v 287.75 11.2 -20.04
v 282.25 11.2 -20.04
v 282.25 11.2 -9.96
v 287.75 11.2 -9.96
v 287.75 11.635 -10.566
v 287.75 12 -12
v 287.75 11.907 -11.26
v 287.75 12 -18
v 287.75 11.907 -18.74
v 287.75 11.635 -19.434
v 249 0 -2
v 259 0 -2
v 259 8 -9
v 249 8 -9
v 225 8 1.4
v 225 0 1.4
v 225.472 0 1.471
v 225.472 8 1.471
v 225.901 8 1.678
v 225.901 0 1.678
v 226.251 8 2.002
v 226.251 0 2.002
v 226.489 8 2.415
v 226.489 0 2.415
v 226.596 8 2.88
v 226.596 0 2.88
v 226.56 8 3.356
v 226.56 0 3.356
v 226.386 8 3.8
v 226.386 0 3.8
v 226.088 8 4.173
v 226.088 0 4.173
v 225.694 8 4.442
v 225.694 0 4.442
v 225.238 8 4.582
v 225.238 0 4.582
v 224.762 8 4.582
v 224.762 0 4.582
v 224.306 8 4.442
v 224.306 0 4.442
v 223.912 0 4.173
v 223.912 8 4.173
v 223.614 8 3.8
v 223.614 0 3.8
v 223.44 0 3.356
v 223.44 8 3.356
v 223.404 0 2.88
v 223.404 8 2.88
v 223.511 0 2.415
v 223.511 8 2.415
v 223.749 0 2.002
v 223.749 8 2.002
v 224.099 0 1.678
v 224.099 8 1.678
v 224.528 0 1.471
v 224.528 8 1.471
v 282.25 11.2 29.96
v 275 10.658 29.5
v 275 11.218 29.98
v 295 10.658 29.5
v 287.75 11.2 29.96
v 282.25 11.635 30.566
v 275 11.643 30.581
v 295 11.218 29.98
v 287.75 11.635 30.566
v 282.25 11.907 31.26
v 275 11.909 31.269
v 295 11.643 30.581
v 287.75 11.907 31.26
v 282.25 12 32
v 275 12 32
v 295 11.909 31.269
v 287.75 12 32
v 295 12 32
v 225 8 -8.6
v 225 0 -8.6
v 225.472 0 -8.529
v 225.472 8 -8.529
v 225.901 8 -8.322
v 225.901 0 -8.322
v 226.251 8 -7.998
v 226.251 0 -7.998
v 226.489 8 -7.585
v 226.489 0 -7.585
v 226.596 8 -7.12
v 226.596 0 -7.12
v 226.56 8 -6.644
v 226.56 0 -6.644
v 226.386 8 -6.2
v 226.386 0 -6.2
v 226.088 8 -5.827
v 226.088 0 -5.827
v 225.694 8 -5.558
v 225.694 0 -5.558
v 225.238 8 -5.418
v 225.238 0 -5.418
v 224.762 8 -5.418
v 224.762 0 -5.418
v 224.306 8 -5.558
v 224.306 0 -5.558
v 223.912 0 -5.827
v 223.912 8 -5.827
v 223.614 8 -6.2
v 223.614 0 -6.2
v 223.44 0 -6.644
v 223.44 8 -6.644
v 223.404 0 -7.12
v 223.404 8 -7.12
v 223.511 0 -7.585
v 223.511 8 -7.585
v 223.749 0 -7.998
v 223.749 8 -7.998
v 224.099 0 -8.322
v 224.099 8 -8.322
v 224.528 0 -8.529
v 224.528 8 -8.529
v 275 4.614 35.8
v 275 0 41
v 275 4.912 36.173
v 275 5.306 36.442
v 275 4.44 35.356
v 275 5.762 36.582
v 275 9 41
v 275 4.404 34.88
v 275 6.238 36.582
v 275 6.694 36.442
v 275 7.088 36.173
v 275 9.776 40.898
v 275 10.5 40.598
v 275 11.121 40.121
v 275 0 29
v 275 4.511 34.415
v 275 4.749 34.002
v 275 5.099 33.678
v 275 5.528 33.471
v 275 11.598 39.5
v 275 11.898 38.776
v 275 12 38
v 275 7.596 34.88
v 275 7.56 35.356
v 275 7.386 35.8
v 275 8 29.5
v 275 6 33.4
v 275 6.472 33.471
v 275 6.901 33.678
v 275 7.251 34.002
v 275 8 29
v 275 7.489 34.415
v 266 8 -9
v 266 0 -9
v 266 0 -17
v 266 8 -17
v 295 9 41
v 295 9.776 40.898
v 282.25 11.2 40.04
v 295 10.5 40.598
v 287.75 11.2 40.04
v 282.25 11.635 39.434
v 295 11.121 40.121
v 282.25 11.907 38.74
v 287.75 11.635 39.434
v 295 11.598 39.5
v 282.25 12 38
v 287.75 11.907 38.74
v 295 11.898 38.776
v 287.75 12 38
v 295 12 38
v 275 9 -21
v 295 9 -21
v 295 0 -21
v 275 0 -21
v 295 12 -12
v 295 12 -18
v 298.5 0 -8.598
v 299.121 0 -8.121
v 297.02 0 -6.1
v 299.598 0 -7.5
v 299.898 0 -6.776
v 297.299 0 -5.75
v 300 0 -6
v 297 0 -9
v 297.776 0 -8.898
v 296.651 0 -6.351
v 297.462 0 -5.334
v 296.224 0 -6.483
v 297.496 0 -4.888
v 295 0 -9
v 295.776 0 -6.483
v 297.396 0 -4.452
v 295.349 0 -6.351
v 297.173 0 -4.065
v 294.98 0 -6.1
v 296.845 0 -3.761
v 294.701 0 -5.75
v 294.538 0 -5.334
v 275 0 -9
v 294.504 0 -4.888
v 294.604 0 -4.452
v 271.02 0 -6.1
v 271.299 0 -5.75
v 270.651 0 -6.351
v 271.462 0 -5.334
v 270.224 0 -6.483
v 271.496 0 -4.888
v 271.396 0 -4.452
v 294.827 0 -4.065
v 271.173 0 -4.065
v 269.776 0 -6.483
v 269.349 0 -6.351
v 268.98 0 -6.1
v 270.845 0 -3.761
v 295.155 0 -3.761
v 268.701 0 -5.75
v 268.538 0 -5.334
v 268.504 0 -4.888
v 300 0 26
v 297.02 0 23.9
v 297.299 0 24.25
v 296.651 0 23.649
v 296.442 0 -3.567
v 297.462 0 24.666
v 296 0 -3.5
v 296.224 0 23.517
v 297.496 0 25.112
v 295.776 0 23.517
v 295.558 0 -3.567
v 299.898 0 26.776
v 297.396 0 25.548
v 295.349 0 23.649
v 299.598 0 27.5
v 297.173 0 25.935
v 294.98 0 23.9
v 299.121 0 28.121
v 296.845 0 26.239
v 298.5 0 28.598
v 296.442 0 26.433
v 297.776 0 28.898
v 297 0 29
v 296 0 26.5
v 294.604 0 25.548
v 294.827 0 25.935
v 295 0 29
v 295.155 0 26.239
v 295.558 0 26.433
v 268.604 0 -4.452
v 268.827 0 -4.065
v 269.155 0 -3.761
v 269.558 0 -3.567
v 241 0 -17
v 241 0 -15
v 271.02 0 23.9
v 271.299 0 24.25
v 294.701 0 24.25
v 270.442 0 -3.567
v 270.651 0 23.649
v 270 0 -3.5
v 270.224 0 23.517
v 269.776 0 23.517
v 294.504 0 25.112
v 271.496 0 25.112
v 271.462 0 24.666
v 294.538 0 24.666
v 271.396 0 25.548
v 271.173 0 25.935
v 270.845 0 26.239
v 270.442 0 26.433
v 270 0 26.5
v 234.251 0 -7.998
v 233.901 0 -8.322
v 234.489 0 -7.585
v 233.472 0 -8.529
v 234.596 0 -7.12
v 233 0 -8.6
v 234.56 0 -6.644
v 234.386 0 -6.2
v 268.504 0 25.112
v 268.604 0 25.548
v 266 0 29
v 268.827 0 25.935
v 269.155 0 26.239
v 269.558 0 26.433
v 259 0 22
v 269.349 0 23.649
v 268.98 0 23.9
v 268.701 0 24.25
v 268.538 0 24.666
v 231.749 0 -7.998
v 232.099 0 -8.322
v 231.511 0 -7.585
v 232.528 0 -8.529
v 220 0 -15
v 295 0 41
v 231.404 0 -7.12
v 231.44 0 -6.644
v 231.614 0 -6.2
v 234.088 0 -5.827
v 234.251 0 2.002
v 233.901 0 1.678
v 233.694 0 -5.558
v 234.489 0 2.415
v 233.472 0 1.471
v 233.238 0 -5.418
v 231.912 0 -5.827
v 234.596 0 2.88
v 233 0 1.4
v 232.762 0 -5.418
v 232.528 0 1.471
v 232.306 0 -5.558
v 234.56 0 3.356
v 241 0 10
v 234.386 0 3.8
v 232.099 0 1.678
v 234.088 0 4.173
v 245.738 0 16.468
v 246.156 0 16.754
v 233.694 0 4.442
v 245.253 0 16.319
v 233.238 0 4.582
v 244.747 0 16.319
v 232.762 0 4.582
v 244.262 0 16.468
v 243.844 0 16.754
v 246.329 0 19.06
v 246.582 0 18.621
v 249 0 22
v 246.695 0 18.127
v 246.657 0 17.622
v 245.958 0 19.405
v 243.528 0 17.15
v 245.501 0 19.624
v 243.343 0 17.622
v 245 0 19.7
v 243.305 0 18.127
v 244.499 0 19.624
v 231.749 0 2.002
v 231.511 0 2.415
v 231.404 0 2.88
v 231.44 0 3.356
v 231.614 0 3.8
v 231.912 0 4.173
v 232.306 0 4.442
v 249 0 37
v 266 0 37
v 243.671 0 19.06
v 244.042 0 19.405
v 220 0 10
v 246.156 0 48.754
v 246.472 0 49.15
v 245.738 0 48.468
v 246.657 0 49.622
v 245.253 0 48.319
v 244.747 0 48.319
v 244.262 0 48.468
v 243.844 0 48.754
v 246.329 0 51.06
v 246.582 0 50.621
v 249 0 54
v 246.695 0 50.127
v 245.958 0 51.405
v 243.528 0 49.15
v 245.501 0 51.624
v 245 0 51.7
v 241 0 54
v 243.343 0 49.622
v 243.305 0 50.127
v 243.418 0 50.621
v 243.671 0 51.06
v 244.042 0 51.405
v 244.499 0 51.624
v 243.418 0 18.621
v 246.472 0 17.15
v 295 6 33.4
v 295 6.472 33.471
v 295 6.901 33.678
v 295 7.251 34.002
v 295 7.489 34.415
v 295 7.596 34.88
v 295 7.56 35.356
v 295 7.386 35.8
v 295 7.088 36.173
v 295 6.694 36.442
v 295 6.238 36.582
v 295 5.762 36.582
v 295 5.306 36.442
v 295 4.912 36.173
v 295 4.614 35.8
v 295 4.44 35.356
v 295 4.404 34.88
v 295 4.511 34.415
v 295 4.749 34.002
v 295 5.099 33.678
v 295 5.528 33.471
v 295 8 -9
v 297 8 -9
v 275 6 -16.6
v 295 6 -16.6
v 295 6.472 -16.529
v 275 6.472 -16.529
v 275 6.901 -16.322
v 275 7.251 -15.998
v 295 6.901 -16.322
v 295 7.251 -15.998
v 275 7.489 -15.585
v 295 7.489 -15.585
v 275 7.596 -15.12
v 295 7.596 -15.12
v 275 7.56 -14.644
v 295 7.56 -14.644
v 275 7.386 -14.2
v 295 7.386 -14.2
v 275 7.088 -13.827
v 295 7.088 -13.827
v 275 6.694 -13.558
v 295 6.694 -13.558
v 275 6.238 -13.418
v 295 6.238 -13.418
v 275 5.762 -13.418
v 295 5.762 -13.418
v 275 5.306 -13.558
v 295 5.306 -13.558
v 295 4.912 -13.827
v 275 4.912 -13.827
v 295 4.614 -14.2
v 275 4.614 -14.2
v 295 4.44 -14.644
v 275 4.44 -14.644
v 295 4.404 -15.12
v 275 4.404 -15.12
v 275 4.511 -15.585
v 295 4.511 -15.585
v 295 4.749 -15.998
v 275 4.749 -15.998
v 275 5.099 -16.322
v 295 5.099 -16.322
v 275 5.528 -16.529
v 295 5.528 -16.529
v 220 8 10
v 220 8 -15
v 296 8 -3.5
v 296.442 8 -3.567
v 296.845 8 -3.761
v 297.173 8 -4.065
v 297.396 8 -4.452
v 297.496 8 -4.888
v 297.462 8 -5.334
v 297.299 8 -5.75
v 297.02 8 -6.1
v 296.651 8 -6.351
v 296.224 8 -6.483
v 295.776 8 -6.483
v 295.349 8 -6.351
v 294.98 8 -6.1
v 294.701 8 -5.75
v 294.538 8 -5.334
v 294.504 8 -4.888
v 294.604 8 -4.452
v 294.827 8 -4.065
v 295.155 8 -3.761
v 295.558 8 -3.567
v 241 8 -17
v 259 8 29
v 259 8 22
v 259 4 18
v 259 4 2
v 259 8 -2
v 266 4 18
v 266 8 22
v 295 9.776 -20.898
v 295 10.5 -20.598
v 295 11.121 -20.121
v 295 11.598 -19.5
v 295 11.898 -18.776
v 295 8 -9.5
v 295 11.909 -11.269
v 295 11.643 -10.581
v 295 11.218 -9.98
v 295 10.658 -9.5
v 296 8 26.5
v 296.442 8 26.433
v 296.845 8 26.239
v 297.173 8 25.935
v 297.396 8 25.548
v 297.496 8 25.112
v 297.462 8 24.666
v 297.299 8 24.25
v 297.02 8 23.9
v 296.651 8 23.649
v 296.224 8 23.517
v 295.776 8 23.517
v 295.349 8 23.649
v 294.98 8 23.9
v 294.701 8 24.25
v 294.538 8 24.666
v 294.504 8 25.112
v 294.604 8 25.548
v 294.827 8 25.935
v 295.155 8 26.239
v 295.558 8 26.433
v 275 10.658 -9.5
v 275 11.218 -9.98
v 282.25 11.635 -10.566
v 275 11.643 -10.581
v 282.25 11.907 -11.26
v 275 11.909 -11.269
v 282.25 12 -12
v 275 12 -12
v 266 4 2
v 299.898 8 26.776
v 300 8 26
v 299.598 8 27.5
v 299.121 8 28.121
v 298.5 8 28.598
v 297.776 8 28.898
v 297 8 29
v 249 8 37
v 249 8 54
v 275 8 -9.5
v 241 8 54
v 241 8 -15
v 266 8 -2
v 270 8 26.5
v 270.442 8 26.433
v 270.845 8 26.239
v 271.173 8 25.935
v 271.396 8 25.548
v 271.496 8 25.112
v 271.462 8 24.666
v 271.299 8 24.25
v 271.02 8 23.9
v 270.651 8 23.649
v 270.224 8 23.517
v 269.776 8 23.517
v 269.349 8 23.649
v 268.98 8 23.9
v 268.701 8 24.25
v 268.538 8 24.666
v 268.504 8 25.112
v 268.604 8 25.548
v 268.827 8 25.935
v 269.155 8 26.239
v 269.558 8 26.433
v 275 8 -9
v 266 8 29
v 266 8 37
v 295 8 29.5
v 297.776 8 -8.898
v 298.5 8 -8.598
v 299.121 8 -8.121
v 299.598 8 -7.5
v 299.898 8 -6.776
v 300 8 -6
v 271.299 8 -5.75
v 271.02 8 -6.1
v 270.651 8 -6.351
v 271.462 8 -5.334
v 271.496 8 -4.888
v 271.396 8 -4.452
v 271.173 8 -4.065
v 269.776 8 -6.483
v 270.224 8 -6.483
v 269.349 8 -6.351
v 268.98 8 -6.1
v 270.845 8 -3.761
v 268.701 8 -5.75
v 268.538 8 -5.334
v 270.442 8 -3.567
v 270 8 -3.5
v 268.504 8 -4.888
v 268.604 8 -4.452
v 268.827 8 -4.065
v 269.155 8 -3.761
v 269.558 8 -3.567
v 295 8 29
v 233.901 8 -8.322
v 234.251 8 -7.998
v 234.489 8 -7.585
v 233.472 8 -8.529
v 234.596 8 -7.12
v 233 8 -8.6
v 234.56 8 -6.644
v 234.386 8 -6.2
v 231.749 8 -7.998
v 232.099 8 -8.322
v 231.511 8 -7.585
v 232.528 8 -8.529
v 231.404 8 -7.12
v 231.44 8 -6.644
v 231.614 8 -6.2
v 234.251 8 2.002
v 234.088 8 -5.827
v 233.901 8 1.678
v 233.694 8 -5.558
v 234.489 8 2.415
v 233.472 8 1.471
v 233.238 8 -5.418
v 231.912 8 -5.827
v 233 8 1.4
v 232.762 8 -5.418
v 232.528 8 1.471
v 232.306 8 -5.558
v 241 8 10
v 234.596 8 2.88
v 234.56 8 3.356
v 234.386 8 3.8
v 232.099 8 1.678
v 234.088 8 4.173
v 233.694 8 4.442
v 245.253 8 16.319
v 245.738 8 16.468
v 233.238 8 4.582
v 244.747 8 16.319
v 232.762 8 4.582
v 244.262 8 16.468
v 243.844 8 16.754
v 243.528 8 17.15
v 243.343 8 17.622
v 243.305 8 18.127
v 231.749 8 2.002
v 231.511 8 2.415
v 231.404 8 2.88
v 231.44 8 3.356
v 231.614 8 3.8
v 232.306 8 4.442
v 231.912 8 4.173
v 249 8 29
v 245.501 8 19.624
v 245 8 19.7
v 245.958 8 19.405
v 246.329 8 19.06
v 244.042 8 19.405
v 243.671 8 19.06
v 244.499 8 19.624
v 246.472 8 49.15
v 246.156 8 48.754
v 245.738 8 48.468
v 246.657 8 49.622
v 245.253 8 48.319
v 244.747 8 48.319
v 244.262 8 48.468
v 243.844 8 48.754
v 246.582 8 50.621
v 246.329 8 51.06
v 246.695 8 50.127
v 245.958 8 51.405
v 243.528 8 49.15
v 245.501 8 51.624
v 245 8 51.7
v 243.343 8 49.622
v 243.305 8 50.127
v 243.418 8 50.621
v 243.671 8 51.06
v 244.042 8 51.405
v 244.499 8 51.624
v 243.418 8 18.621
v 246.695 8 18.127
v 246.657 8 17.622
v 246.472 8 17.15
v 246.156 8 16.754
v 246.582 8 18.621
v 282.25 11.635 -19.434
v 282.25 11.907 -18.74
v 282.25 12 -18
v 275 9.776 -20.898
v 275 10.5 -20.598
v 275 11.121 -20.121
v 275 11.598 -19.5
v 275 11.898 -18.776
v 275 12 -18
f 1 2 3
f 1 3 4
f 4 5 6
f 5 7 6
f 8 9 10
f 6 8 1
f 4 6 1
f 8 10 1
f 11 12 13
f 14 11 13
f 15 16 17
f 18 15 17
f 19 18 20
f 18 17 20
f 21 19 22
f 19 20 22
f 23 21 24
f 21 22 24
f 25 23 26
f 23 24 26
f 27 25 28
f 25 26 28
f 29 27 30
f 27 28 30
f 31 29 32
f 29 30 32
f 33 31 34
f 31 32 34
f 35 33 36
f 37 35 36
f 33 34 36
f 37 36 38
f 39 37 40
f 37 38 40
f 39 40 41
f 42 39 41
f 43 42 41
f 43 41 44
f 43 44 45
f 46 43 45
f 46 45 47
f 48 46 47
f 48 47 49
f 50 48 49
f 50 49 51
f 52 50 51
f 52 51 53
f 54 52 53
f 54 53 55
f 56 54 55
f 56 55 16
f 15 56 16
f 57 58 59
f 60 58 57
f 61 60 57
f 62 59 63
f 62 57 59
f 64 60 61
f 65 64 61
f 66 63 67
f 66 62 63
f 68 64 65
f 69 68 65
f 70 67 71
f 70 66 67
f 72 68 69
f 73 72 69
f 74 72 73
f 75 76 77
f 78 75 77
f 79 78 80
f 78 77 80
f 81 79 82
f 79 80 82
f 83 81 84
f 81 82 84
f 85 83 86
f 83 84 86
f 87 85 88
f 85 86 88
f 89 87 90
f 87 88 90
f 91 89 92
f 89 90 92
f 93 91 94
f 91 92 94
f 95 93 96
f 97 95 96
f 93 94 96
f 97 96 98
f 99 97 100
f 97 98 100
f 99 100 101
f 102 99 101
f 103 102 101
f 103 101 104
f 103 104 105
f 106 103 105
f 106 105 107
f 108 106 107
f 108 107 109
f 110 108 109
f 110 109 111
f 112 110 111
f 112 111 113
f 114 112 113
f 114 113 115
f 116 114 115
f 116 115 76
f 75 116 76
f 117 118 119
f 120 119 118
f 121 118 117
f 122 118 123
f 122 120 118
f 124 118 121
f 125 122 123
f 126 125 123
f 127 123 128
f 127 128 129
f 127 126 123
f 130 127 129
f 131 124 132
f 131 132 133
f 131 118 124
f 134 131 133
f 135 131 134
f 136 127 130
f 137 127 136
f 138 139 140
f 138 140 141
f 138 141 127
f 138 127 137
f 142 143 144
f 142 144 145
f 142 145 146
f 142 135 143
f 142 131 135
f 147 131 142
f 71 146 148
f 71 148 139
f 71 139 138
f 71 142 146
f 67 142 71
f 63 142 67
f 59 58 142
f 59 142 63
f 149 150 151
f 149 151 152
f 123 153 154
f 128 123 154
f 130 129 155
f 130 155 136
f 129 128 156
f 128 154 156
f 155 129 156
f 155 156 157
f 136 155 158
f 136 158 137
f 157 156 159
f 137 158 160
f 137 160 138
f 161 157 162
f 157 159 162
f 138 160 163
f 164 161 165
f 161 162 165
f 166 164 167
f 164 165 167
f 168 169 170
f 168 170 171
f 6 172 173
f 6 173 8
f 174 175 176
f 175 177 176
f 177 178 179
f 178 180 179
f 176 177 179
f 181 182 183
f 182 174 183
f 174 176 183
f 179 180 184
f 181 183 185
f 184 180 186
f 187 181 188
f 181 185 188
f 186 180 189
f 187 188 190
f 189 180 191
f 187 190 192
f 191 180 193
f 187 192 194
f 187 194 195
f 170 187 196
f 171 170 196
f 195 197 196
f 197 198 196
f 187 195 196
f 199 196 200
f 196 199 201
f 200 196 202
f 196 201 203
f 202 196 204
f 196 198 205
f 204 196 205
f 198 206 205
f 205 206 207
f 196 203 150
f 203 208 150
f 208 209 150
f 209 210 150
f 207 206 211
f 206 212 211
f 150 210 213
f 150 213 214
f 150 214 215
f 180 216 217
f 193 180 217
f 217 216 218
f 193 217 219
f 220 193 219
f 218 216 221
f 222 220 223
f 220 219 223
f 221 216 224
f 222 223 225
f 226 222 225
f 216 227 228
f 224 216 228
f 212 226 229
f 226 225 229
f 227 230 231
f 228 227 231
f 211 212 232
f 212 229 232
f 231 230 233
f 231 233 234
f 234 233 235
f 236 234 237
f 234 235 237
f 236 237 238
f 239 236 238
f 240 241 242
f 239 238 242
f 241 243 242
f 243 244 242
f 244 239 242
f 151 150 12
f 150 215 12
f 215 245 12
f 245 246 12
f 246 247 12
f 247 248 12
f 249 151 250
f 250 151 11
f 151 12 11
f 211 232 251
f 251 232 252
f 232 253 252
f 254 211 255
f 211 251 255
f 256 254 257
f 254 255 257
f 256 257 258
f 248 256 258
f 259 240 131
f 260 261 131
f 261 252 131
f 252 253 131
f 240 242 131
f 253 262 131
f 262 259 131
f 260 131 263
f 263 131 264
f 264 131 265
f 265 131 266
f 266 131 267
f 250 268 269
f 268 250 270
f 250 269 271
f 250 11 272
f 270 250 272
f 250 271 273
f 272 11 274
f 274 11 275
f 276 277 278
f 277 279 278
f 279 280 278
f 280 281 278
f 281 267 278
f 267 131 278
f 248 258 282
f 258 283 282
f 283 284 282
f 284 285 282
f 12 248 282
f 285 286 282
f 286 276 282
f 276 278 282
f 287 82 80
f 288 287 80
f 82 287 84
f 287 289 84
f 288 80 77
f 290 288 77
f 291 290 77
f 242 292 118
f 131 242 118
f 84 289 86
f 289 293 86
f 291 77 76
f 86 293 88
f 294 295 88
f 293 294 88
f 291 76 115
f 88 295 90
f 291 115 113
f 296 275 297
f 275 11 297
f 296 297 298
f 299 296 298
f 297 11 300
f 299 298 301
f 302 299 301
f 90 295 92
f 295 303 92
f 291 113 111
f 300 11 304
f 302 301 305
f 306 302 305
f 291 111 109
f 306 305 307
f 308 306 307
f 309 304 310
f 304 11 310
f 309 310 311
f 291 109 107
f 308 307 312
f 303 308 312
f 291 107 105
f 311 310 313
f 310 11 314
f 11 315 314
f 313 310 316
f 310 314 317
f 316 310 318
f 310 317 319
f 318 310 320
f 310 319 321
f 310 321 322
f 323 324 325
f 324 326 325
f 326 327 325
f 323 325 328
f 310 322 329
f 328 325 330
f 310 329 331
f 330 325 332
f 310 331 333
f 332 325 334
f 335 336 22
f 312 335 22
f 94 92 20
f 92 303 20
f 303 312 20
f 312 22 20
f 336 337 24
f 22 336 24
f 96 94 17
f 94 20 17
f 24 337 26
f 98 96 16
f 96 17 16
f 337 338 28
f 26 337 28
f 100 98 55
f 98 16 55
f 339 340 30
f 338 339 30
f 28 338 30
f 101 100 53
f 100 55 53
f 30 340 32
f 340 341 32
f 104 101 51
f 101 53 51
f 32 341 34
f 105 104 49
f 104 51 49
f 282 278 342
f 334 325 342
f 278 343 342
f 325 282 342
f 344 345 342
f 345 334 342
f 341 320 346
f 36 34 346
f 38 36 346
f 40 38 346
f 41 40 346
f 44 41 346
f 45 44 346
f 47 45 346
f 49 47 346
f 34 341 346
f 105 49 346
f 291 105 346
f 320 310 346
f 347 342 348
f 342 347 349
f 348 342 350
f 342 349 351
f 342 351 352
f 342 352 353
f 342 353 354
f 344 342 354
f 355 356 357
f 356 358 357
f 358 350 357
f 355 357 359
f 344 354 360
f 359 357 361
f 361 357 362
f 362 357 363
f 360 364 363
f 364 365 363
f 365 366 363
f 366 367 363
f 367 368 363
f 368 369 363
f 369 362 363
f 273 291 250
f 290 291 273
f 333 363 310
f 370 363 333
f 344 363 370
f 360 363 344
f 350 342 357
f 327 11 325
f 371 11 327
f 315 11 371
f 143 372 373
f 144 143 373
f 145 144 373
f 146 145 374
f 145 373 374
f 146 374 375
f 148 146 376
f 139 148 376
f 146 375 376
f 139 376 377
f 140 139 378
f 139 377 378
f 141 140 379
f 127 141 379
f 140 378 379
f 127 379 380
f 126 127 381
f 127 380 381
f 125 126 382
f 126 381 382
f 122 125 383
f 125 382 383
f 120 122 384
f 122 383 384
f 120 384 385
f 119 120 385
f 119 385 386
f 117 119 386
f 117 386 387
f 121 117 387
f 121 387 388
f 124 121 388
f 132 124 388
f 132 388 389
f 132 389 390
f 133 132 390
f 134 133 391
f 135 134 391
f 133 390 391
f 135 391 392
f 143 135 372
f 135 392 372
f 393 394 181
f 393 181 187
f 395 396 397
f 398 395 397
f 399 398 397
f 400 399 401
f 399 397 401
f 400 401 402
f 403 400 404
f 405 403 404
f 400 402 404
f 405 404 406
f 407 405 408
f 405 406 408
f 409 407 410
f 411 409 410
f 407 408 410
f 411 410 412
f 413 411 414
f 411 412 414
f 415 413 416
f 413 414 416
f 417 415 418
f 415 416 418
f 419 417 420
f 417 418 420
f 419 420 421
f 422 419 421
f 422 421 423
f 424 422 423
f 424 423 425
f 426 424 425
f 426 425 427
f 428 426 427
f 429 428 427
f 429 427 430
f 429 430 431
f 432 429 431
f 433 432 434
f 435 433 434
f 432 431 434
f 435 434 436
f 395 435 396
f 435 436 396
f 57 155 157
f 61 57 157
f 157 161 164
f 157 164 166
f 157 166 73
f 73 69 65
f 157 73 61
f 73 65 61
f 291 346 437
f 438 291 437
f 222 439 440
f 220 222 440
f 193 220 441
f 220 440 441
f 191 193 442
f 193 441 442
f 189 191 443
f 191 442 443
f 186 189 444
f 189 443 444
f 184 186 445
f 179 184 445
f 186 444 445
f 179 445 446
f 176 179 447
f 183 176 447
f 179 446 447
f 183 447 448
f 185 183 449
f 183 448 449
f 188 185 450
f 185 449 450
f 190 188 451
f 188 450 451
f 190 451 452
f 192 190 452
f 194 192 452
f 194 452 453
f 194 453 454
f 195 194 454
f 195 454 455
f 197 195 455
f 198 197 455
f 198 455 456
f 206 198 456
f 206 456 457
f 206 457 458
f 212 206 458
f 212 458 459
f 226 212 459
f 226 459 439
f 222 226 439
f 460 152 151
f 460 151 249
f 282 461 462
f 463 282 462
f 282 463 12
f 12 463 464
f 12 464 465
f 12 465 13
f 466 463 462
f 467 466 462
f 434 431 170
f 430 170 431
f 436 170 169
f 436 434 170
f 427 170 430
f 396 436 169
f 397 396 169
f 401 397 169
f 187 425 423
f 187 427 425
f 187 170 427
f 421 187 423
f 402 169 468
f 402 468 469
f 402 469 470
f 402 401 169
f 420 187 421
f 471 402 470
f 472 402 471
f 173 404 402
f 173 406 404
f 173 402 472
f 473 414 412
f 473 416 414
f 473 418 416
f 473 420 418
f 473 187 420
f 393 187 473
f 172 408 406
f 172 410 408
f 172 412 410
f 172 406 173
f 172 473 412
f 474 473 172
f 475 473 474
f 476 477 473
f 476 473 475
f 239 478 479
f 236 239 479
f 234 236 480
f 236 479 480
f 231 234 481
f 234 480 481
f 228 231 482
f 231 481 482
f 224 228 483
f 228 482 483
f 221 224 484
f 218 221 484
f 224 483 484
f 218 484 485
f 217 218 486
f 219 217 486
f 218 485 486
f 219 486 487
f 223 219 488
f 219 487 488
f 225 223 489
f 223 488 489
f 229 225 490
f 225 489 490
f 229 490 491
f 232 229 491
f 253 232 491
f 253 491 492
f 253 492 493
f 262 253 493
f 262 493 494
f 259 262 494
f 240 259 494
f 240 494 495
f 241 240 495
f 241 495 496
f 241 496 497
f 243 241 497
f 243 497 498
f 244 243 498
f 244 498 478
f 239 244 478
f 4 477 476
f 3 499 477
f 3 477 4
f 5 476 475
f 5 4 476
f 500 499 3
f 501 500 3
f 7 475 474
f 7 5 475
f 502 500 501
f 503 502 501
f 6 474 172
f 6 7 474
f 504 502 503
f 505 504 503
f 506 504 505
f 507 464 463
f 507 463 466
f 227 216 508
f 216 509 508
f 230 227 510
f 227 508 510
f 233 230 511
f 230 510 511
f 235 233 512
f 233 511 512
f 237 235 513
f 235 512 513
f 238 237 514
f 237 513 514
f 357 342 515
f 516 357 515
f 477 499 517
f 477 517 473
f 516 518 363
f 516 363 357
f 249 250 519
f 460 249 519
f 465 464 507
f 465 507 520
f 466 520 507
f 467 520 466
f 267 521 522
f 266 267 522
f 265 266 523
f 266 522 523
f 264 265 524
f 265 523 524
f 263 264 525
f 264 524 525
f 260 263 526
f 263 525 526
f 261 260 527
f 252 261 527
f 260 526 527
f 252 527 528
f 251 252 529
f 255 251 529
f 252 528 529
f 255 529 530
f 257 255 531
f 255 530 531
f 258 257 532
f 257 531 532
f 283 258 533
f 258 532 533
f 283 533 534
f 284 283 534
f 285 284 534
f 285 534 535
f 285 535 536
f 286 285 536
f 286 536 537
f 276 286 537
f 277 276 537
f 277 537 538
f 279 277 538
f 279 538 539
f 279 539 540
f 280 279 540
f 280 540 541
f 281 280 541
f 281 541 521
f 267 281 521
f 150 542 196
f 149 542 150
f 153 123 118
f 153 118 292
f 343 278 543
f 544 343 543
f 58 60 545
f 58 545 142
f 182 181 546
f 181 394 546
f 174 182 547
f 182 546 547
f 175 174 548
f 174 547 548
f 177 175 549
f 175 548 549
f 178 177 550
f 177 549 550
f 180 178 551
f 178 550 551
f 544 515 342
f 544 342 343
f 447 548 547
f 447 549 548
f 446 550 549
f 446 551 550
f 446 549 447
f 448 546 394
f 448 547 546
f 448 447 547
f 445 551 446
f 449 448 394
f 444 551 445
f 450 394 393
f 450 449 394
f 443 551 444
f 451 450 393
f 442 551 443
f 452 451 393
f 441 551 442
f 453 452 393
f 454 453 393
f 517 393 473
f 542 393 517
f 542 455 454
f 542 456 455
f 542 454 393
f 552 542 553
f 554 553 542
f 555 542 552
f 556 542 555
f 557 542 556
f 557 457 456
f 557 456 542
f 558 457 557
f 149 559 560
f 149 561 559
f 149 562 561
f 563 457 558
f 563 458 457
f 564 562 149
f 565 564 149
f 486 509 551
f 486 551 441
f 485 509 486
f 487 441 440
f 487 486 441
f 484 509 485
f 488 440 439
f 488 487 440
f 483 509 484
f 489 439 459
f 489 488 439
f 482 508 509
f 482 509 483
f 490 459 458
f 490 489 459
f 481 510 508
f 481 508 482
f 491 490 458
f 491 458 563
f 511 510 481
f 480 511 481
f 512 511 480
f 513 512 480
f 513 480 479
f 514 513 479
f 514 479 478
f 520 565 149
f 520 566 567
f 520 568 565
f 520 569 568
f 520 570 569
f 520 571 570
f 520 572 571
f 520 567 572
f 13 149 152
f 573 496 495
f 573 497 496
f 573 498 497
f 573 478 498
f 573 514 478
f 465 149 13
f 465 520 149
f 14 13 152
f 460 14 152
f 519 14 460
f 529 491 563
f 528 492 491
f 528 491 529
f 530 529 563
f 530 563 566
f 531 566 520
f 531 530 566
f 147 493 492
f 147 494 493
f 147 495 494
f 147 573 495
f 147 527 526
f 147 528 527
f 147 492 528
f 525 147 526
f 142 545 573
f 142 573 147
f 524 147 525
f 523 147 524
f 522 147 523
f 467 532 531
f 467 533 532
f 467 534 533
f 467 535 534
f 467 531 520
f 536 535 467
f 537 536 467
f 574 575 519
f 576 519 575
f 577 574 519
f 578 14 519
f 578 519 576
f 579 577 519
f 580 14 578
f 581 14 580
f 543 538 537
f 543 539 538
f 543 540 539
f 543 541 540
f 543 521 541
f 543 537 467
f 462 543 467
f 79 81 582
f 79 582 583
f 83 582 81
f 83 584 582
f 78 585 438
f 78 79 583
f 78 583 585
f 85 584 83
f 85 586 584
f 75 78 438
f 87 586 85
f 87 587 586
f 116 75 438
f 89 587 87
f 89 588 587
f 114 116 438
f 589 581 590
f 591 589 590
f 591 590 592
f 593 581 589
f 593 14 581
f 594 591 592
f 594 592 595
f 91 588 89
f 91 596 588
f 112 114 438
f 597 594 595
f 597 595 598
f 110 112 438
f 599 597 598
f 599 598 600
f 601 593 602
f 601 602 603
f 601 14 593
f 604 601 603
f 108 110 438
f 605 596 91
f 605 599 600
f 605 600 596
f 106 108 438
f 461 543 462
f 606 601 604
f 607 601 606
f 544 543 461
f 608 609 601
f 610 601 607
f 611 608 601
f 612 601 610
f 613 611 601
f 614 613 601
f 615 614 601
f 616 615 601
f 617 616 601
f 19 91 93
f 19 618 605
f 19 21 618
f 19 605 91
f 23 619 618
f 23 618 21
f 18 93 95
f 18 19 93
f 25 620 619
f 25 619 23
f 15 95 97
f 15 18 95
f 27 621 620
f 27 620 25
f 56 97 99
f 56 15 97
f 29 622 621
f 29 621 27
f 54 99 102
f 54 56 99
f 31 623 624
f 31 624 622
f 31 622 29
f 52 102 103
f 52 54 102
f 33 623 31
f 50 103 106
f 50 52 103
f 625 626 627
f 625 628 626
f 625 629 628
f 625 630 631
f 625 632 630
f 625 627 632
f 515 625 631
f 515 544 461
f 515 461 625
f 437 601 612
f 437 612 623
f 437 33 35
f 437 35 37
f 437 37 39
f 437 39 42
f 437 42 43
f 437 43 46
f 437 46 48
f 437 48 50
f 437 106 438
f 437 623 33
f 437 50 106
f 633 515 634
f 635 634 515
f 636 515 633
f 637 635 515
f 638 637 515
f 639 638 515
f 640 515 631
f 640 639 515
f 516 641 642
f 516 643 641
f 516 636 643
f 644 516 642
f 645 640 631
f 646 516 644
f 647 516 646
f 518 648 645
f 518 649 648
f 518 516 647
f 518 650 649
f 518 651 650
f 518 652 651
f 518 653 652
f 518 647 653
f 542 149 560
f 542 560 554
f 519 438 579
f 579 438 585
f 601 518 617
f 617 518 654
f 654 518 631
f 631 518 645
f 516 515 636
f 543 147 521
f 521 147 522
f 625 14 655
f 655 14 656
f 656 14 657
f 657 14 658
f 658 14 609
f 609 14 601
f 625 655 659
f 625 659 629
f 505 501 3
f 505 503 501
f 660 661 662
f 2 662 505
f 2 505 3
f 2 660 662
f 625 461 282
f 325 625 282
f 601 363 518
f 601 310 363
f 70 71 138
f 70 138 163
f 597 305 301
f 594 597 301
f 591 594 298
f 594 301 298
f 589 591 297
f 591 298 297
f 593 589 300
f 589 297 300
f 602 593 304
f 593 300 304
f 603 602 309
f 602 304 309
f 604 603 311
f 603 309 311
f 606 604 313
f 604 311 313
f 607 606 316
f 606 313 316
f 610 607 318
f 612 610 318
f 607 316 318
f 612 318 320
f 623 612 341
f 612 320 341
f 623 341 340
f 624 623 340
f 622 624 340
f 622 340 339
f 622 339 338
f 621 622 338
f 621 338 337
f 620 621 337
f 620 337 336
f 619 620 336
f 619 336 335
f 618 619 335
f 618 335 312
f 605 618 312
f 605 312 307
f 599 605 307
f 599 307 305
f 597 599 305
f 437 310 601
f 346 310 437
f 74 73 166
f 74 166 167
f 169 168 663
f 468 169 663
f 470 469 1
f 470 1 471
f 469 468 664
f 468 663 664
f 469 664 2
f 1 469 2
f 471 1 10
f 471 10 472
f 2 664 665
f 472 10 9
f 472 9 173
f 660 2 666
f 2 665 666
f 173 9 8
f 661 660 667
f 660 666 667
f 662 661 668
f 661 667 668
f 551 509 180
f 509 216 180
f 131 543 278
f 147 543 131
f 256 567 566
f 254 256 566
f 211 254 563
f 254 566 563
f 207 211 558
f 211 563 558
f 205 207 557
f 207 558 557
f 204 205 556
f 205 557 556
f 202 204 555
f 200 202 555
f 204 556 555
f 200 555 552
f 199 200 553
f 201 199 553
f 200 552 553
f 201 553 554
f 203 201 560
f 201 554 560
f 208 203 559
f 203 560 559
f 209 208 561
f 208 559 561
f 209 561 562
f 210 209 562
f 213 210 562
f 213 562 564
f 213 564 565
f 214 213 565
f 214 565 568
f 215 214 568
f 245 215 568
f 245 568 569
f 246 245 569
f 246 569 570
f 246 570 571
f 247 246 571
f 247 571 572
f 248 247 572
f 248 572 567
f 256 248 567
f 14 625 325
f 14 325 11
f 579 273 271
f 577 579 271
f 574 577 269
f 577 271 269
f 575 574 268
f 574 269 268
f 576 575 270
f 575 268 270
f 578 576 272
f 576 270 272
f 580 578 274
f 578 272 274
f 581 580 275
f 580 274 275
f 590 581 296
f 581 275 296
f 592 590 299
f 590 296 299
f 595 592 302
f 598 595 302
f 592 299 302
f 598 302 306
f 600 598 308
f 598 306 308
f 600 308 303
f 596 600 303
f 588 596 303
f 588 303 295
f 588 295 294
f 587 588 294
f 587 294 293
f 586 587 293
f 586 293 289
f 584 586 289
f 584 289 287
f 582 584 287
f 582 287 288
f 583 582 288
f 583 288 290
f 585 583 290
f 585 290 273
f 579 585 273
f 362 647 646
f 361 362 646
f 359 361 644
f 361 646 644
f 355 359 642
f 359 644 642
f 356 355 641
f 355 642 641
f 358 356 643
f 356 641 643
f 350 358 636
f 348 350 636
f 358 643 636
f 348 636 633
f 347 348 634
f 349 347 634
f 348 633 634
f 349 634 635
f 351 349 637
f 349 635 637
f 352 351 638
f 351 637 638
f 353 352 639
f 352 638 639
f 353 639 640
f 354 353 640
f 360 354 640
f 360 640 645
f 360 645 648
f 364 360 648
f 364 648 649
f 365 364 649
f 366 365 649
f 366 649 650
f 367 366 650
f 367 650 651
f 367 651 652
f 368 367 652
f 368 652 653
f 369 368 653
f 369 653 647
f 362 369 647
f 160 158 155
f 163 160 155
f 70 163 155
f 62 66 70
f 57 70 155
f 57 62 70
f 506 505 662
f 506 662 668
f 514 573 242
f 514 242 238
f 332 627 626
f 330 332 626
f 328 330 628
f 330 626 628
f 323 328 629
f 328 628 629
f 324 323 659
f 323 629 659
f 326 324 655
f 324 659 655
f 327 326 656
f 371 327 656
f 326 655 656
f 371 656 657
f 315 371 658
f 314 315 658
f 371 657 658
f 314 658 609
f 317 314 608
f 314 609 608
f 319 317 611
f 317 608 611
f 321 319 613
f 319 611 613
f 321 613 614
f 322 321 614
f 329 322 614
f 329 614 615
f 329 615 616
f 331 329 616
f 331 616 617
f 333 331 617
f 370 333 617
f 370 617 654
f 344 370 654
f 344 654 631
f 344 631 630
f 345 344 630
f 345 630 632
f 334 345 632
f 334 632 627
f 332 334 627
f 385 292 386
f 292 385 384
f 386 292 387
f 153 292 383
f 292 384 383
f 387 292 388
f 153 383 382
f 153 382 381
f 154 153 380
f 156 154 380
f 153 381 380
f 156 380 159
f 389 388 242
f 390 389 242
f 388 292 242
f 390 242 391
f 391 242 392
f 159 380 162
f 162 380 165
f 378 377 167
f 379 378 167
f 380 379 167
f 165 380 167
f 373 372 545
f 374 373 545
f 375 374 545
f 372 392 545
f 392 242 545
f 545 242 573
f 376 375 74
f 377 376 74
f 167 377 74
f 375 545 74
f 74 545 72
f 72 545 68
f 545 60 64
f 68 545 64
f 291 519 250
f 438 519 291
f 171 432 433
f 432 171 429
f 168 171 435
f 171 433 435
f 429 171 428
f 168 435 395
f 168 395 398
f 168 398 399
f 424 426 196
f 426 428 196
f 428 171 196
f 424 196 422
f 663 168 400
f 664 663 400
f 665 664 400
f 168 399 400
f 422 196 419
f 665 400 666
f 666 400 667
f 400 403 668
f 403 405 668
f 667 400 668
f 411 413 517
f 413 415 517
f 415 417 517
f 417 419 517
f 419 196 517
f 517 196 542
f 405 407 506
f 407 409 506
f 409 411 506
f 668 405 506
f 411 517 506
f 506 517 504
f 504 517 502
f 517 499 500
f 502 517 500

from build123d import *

# Parameters (mm, degrees)
SKETCH1_W            = 300
SKETCH1_H            = 20
BOSS_EXTRUDE1_DEPTH  = 8
SKETCH2_W            = 34
SKETCH2_H            = 8
BOSS_EXTRUDE2_DEPTH  = 9
SKETCH3_W            = 34
SKETCH3_H            = 8
BOSS_EXTRUDE3_DEPTH  = 9
SKETCH4_R            = 1.5
CUT_EXTRUDE1_DEPTH   = 302.504560496
SKETCH5_W            = 25
SKETCH5_H            = 8
BOSS_EXTRUDE4_DEPTH  = 17
SKETCH6_W            = 25
SKETCH6_H            = 8
BOSS_EXTRUDE5_DEPTH  = 17
SKETCH7_W            = 10
SKETCH7_H            = 38
CUT_EXTRUDE2_DEPTH   = 303.37890138
SKETCH8_W            = 7
SKETCH8_H            = 16
CUT_EXTRUDE3_DEPTH   = 4
CUT_EXTRUDE4_DEPTH   = 7
BOSS_EXTRUDE6_DEPTH  = 10
SKETCH12_W           = 8
SKETCH12_H           = 8
BOSS_EXTRUDE7_DEPTH  = 17
SKETCH13_R           = 1.7
CUT_EXTRUDE6_DEPTH   = 305.926220585
SKETCH14_W           = 20
SKETCH14_H           = 12
BOSS_EXTRUDE8_DEPTH  = 12
SKETCH15_R           = 1.6
CUT_EXTRUDE7_DEPTH   = 20
SKETCH16_W           = 20
SKETCH16_H           = 12
BOSS_EXTRUDE9_DEPTH  = 12
SKETCH17_R           = 1.6
CUT_EXTRUDE8_DEPTH   = 20
SKETCH18_W           = 20
SKETCH18_H           = 13
BOSS_EXTRUDE10_DEPTH = 12
SKETCH19_R           = 1.6
CUT_EXTRUDE9_DEPTH   = 20
SKETCH20_W           = 20
SKETCH20_H           = 13
BOSS_EXTRUDE11_DEPTH = 12
SKETCH21_R           = 1.6
CUT_EXTRUDE10_DEPTH  = 20
FILLET6_R            = 3
SKETCH28_W           = 198.881436238
SKETCH28_H           = 556.355103816
CUT_EXTRUDE14_DEPTH  = 220
SKETCH29_W           = 21
SKETCH29_H           = 8
BOSS_EXTRUDE12_DEPTH = 15
SKETCH30_W           = 21
SKETCH30_H           = 10
CUT_EXTRUDE15_DEPTH  = 306.057371653
SKETCH31_R           = 1.6
CUT_EXTRUDE16_DEPTH  = 306.057371653
FILLET7_R            = 3
SKETCH32_W           = 5.5
SKETCH32_H           = 70.463459777
CUT_EXTRUDE17_DEPTH  = 0.8
SKETCH33_W           = 20
SKETCH33_H           = 4.963841857
CUT_EXTRUDE18_DEPTH  = 0.5
SKETCH34_W           = 20
SKETCH34_H           = 11.942443484
CUT_EXTRUDE19_DEPTH  = 0.5


with BuildPart() as part:
    # Sketch1 → Boss-Extrude1 (new body)
    with BuildSketch(Plane(origin=(0, 0, 0), x_dir=(1, 0, 0), z_dir=(0, 1, 0))):
        with Locations((150, -10)):
            Rectangle(SKETCH1_W, SKETCH1_H)
    extrude(amount=BOSS_EXTRUDE1_DEPTH)

    # Sketch2 → Boss-Extrude2 (add)
    with BuildSketch(Plane.XY.offset(20)):
        with Locations((17, 4)):
            Rectangle(SKETCH2_W, SKETCH2_H)
        with Locations((283, 4)):
            Rectangle(SKETCH2_W, SKETCH2_H)
    extrude(amount=BOSS_EXTRUDE2_DEPTH)

    # Sketch3 → Boss-Extrude3 (add)
    with BuildSketch(Plane(origin=(0, 0, 0), x_dir=(-1, 0, 0), z_dir=(0, 0, -1))):
        with Locations((-17, 4)):
            Rectangle(SKETCH3_W, SKETCH3_H)
        with Locations((-283, 4)):
            Rectangle(SKETCH3_W, SKETCH3_H)
    extrude(amount=BOSS_EXTRUDE3_DEPTH)

    # Sketch4 → Cut-Extrude1 (cut, through all)
    with BuildSketch(Plane(origin=(0, 8, 0), x_dir=(1, 0, 0), z_dir=(0, 1, 0))):
        with Locations(Location((4, 5, 0), (0, 0, 270))):
            Circle(SKETCH4_R)
        with Locations(Location((30, 5, 0), (0, 0, 270))):
            Circle(SKETCH4_R)
        with Locations(Location((30, -25, 0), (0, 0, 270))):
            Circle(SKETCH4_R)
        with Locations(Location((4, -25, 0), (0, 0, 270))):
            Circle(SKETCH4_R)
        with Locations(Location((296, -25, 0), (0, 0, 270))):
            Circle(SKETCH4_R)
        with Locations(Location((296, 5, 0), (0, 0, 270))):
            Circle(SKETCH4_R)
        with Locations(Location((270, -25, 0), (0, 0, 270))):
            Circle(SKETCH4_R)
        with Locations(Location((270, 5, 0), (0, 0, 270))):
            Circle(SKETCH4_R)
    extrude(amount=-CUT_EXTRUDE1_DEPTH, mode=Mode.SUBTRACT)

    # Sketch5 → Boss-Extrude4 (add)
    with BuildSketch(Plane.XY.offset(20)):
        with Locations((253.5, 4)):
            Rectangle(SKETCH5_W, SKETCH5_H)
    extrude(amount=BOSS_EXTRUDE4_DEPTH)

    # Sketch6 → Boss-Extrude5 (add)
    with BuildSketch(Plane(origin=(0, 0, 0), x_dir=(-1, 0, 0), z_dir=(0, 0, -1))):
        with Locations((-253.5, 4)):
            Rectangle(SKETCH6_W, SKETCH6_H)
    extrude(amount=BOSS_EXTRUDE5_DEPTH)

    # Sketch7 → Cut-Extrude2 (cut, through all)
    with BuildSketch(Plane(origin=(0, 8, 0), x_dir=(1, 0, 0), z_dir=(0, 1, 0))):
        with Locations((254, -10)):
            Rectangle(SKETCH7_W, SKETCH7_H)
    extrude(amount=-CUT_EXTRUDE2_DEPTH, mode=Mode.SUBTRACT)

    # Sketch8 → Cut-Extrude3 (cut)
    with BuildSketch(Plane(origin=(0, 8, 0), x_dir=(1, 0, 0), z_dir=(0, 1, 0))):
        with Locations((262.5, -10)):
            Rectangle(SKETCH8_W, SKETCH8_H)
    extrude(amount=-CUT_EXTRUDE3_DEPTH, mode=Mode.SUBTRACT)

    # Sketch9 → Cut-Extrude4 (cut)
    with BuildSketch(Plane.ZY.offset(-259)):
        Polygon((18, 4), (22, 8), (18, 8), align=None)
        Polygon((2, 4), (-2, 8), (2, 8), align=None)
    extrude(amount=-CUT_EXTRUDE4_DEPTH, mode=Mode.SUBTRACT)

    # Sketch10 → Boss-Extrude6 (add)
    with BuildSketch(Plane.ZY.offset(-259)):
        Polygon((-2, 0), (-9, 8), (-9, 0), align=None)
        Polygon((29, 8), (22, 0), (29, 0), align=None)
    extrude(amount=BOSS_EXTRUDE6_DEPTH)

    # Sketch12 → Boss-Extrude7 (add)
    with BuildSketch(Plane.XY.offset(37)):
        with Locations((245, 4)):
            Rectangle(SKETCH12_W, SKETCH12_H)
    extrude(amount=BOSS_EXTRUDE7_DEPTH)

    # Sketch13 → Cut-Extrude6 (cut, through all)
    with BuildSketch(Plane(origin=(0, 8, 0), x_dir=(1, 0, 0), z_dir=(0, 1, 0))):
        with Locations(Location((245, -50, 0), (0, 0, 270))):
            Circle(SKETCH13_R)
        with Locations(Location((245, -18, 0), (0, 0, 270))):
            Circle(SKETCH13_R)
    extrude(amount=-CUT_EXTRUDE6_DEPTH, mode=Mode.SUBTRACT)

    # Sketch14 → Boss-Extrude8 (add)
    with BuildSketch(Plane.XY.offset(29)):
        with Locations((285, 6)):
            Rectangle(SKETCH14_W, SKETCH14_H)
    extrude(amount=BOSS_EXTRUDE8_DEPTH)

    # Sketch15 → Cut-Extrude7 (cut)
    with BuildSketch(Plane(origin=(295, 0, 0), x_dir=(0, 0, -1), z_dir=(1, 0, 0))):
        with Locations((-35, 6)):
            Circle(SKETCH15_R)
    extrude(amount=-CUT_EXTRUDE7_DEPTH, mode=Mode.SUBTRACT)

    # Sketch16 → Boss-Extrude9 (add)
    with BuildSketch(Plane(origin=(0, 0, -9), x_dir=(-1, 0, 0), z_dir=(0, 0, -1))):
        with Locations((-285, 6)):
            Rectangle(SKETCH16_W, SKETCH16_H)
    extrude(amount=BOSS_EXTRUDE9_DEPTH)

    # Sketch17 → Cut-Extrude8 (cut)
    with BuildSketch(Plane(origin=(295, 0, 0), x_dir=(0, 0, -1), z_dir=(1, 0, 0))):
        with Locations((15, 6)):
            Circle(SKETCH17_R)
    extrude(amount=-CUT_EXTRUDE8_DEPTH, mode=Mode.SUBTRACT)

    # Sketch18 → Boss-Extrude10 (add)
    with BuildSketch(Plane(origin=(0, 0, -9), x_dir=(-1, 0, 0), z_dir=(0, 0, -1))):
        with Locations((-15, 6.5)):
            Rectangle(SKETCH18_W, SKETCH18_H)
    extrude(amount=BOSS_EXTRUDE10_DEPTH)

    # Sketch19 → Cut-Extrude9 (cut)
    with BuildSketch(Plane.ZY.offset(-5)):
        with Locations((-15, 8)):
            Circle(SKETCH19_R)
    extrude(amount=-CUT_EXTRUDE9_DEPTH, mode=Mode.SUBTRACT)

    # Sketch20 → Boss-Extrude11 (add)
    with BuildSketch(Plane.XY.offset(29)):
        with Locations((15, 6.5)):
            Rectangle(SKETCH20_W, SKETCH20_H)
    extrude(amount=BOSS_EXTRUDE11_DEPTH)

    # Sketch21 → Cut-Extrude10 (cut)
    with BuildSketch(Plane.ZY.offset(-5)):
        with Locations((35, 8)):
            Circle(SKETCH21_R)
    extrude(amount=-CUT_EXTRUDE10_DEPTH, mode=Mode.SUBTRACT)

    # Fillet6
    fillet6_edges = [part.edges().sort_by_distance(p)[0] for p in [
        (285, 12, 29),
        (285, 12, 41),
        (285, 12, -9),
        (285, 12, -21),
        (15, 13, -9),
        (15, 13, -21),
        (15, 13, 29),
        (15, 13, 41),
    ]]
    fillet(fillet6_edges, radius=FILLET6_R)

    # Sketch28 → Cut-Extrude14 (cut)
    with BuildSketch(Plane.ZY):
        with Locations((-20.495432896, -60.484201615)):
            Rectangle(SKETCH28_W, SKETCH28_H)
    extrude(amount=-CUT_EXTRUDE14_DEPTH, mode=Mode.SUBTRACT)

    # Sketch29 → Boss-Extrude12 (add)
    with BuildSketch(Plane(origin=(0, 0, 0), x_dir=(-1, 0, 0), z_dir=(0, 0, -1))):
        with Locations((-230.5, 4)):
            Rectangle(SKETCH29_W, SKETCH29_H)
    extrude(amount=BOSS_EXTRUDE12_DEPTH)

    # Sketch30 → Cut-Extrude15 (cut, through all)
    with BuildSketch(Plane(origin=(0, 0, 0), x_dir=(-1, 0, 0), z_dir=(0, -1, 0))):
        with Locations((-230.5, -15)):
            Rectangle(SKETCH30_W, SKETCH30_H)
    extrude(amount=-CUT_EXTRUDE15_DEPTH, mode=Mode.SUBTRACT)

    # Sketch31 → Cut-Extrude16 (cut, through all)
    with BuildSketch(Plane(origin=(0, 0, 0), x_dir=(-1, 0, 0), z_dir=(0, -1, 0))):
        with Locations(Location((-225, 7, 0), (0, 0, 90))):
            Circle(SKETCH31_R)
        with Locations(Location((-225, -3, 0), (0, 0, 90))):
            Circle(SKETCH31_R)
        with Locations(Location((-233, 7, 0), (0, 0, 90))):
            Circle(SKETCH31_R)
        with Locations(Location((-233, -3, 0), (0, 0, 90))):
            Circle(SKETCH31_R)
    extrude(amount=-CUT_EXTRUDE16_DEPTH, mode=Mode.SUBTRACT)

    # Fillet7
    fillet7_edges = [part.edges().sort_by_distance(p)[0] for p in [
        (300, 4, 29),
        (300, 4, -9),
    ]]
    fillet(fillet7_edges, radius=FILLET7_R)

    # Sketch32 → Cut-Extrude17 (cut)
    with BuildSketch(Plane(origin=(0, 12, 0), x_dir=(1, 0, 0), z_dir=(0, 1, 0))):
        with Locations((285, -7.2213573)):
            Rectangle(SKETCH32_W, SKETCH32_H)
    extrude(amount=-CUT_EXTRUDE17_DEPTH, mode=Mode.SUBTRACT)

    # Sketch33 → Cut-Extrude18 (cut)
    with BuildSketch(Plane(origin=(0, 0, 29), x_dir=(-1, 0, 0), z_dir=(0, 0, -1))):
        with Locations((-285, 10.481920928)):
            Rectangle(SKETCH33_W, SKETCH33_H)
    extrude(amount=-CUT_EXTRUDE18_DEPTH, mode=Mode.SUBTRACT)

    # Sketch34 → Cut-Extrude19 (cut)
    with BuildSketch(Plane.XY.offset(-9)):
        with Locations((285, 13.971221742)):
            Rectangle(SKETCH34_W, SKETCH34_H)
    extrude(amount=-CUT_EXTRUDE19_DEPTH, mode=Mode.SUBTRACT)


solid = part.part
